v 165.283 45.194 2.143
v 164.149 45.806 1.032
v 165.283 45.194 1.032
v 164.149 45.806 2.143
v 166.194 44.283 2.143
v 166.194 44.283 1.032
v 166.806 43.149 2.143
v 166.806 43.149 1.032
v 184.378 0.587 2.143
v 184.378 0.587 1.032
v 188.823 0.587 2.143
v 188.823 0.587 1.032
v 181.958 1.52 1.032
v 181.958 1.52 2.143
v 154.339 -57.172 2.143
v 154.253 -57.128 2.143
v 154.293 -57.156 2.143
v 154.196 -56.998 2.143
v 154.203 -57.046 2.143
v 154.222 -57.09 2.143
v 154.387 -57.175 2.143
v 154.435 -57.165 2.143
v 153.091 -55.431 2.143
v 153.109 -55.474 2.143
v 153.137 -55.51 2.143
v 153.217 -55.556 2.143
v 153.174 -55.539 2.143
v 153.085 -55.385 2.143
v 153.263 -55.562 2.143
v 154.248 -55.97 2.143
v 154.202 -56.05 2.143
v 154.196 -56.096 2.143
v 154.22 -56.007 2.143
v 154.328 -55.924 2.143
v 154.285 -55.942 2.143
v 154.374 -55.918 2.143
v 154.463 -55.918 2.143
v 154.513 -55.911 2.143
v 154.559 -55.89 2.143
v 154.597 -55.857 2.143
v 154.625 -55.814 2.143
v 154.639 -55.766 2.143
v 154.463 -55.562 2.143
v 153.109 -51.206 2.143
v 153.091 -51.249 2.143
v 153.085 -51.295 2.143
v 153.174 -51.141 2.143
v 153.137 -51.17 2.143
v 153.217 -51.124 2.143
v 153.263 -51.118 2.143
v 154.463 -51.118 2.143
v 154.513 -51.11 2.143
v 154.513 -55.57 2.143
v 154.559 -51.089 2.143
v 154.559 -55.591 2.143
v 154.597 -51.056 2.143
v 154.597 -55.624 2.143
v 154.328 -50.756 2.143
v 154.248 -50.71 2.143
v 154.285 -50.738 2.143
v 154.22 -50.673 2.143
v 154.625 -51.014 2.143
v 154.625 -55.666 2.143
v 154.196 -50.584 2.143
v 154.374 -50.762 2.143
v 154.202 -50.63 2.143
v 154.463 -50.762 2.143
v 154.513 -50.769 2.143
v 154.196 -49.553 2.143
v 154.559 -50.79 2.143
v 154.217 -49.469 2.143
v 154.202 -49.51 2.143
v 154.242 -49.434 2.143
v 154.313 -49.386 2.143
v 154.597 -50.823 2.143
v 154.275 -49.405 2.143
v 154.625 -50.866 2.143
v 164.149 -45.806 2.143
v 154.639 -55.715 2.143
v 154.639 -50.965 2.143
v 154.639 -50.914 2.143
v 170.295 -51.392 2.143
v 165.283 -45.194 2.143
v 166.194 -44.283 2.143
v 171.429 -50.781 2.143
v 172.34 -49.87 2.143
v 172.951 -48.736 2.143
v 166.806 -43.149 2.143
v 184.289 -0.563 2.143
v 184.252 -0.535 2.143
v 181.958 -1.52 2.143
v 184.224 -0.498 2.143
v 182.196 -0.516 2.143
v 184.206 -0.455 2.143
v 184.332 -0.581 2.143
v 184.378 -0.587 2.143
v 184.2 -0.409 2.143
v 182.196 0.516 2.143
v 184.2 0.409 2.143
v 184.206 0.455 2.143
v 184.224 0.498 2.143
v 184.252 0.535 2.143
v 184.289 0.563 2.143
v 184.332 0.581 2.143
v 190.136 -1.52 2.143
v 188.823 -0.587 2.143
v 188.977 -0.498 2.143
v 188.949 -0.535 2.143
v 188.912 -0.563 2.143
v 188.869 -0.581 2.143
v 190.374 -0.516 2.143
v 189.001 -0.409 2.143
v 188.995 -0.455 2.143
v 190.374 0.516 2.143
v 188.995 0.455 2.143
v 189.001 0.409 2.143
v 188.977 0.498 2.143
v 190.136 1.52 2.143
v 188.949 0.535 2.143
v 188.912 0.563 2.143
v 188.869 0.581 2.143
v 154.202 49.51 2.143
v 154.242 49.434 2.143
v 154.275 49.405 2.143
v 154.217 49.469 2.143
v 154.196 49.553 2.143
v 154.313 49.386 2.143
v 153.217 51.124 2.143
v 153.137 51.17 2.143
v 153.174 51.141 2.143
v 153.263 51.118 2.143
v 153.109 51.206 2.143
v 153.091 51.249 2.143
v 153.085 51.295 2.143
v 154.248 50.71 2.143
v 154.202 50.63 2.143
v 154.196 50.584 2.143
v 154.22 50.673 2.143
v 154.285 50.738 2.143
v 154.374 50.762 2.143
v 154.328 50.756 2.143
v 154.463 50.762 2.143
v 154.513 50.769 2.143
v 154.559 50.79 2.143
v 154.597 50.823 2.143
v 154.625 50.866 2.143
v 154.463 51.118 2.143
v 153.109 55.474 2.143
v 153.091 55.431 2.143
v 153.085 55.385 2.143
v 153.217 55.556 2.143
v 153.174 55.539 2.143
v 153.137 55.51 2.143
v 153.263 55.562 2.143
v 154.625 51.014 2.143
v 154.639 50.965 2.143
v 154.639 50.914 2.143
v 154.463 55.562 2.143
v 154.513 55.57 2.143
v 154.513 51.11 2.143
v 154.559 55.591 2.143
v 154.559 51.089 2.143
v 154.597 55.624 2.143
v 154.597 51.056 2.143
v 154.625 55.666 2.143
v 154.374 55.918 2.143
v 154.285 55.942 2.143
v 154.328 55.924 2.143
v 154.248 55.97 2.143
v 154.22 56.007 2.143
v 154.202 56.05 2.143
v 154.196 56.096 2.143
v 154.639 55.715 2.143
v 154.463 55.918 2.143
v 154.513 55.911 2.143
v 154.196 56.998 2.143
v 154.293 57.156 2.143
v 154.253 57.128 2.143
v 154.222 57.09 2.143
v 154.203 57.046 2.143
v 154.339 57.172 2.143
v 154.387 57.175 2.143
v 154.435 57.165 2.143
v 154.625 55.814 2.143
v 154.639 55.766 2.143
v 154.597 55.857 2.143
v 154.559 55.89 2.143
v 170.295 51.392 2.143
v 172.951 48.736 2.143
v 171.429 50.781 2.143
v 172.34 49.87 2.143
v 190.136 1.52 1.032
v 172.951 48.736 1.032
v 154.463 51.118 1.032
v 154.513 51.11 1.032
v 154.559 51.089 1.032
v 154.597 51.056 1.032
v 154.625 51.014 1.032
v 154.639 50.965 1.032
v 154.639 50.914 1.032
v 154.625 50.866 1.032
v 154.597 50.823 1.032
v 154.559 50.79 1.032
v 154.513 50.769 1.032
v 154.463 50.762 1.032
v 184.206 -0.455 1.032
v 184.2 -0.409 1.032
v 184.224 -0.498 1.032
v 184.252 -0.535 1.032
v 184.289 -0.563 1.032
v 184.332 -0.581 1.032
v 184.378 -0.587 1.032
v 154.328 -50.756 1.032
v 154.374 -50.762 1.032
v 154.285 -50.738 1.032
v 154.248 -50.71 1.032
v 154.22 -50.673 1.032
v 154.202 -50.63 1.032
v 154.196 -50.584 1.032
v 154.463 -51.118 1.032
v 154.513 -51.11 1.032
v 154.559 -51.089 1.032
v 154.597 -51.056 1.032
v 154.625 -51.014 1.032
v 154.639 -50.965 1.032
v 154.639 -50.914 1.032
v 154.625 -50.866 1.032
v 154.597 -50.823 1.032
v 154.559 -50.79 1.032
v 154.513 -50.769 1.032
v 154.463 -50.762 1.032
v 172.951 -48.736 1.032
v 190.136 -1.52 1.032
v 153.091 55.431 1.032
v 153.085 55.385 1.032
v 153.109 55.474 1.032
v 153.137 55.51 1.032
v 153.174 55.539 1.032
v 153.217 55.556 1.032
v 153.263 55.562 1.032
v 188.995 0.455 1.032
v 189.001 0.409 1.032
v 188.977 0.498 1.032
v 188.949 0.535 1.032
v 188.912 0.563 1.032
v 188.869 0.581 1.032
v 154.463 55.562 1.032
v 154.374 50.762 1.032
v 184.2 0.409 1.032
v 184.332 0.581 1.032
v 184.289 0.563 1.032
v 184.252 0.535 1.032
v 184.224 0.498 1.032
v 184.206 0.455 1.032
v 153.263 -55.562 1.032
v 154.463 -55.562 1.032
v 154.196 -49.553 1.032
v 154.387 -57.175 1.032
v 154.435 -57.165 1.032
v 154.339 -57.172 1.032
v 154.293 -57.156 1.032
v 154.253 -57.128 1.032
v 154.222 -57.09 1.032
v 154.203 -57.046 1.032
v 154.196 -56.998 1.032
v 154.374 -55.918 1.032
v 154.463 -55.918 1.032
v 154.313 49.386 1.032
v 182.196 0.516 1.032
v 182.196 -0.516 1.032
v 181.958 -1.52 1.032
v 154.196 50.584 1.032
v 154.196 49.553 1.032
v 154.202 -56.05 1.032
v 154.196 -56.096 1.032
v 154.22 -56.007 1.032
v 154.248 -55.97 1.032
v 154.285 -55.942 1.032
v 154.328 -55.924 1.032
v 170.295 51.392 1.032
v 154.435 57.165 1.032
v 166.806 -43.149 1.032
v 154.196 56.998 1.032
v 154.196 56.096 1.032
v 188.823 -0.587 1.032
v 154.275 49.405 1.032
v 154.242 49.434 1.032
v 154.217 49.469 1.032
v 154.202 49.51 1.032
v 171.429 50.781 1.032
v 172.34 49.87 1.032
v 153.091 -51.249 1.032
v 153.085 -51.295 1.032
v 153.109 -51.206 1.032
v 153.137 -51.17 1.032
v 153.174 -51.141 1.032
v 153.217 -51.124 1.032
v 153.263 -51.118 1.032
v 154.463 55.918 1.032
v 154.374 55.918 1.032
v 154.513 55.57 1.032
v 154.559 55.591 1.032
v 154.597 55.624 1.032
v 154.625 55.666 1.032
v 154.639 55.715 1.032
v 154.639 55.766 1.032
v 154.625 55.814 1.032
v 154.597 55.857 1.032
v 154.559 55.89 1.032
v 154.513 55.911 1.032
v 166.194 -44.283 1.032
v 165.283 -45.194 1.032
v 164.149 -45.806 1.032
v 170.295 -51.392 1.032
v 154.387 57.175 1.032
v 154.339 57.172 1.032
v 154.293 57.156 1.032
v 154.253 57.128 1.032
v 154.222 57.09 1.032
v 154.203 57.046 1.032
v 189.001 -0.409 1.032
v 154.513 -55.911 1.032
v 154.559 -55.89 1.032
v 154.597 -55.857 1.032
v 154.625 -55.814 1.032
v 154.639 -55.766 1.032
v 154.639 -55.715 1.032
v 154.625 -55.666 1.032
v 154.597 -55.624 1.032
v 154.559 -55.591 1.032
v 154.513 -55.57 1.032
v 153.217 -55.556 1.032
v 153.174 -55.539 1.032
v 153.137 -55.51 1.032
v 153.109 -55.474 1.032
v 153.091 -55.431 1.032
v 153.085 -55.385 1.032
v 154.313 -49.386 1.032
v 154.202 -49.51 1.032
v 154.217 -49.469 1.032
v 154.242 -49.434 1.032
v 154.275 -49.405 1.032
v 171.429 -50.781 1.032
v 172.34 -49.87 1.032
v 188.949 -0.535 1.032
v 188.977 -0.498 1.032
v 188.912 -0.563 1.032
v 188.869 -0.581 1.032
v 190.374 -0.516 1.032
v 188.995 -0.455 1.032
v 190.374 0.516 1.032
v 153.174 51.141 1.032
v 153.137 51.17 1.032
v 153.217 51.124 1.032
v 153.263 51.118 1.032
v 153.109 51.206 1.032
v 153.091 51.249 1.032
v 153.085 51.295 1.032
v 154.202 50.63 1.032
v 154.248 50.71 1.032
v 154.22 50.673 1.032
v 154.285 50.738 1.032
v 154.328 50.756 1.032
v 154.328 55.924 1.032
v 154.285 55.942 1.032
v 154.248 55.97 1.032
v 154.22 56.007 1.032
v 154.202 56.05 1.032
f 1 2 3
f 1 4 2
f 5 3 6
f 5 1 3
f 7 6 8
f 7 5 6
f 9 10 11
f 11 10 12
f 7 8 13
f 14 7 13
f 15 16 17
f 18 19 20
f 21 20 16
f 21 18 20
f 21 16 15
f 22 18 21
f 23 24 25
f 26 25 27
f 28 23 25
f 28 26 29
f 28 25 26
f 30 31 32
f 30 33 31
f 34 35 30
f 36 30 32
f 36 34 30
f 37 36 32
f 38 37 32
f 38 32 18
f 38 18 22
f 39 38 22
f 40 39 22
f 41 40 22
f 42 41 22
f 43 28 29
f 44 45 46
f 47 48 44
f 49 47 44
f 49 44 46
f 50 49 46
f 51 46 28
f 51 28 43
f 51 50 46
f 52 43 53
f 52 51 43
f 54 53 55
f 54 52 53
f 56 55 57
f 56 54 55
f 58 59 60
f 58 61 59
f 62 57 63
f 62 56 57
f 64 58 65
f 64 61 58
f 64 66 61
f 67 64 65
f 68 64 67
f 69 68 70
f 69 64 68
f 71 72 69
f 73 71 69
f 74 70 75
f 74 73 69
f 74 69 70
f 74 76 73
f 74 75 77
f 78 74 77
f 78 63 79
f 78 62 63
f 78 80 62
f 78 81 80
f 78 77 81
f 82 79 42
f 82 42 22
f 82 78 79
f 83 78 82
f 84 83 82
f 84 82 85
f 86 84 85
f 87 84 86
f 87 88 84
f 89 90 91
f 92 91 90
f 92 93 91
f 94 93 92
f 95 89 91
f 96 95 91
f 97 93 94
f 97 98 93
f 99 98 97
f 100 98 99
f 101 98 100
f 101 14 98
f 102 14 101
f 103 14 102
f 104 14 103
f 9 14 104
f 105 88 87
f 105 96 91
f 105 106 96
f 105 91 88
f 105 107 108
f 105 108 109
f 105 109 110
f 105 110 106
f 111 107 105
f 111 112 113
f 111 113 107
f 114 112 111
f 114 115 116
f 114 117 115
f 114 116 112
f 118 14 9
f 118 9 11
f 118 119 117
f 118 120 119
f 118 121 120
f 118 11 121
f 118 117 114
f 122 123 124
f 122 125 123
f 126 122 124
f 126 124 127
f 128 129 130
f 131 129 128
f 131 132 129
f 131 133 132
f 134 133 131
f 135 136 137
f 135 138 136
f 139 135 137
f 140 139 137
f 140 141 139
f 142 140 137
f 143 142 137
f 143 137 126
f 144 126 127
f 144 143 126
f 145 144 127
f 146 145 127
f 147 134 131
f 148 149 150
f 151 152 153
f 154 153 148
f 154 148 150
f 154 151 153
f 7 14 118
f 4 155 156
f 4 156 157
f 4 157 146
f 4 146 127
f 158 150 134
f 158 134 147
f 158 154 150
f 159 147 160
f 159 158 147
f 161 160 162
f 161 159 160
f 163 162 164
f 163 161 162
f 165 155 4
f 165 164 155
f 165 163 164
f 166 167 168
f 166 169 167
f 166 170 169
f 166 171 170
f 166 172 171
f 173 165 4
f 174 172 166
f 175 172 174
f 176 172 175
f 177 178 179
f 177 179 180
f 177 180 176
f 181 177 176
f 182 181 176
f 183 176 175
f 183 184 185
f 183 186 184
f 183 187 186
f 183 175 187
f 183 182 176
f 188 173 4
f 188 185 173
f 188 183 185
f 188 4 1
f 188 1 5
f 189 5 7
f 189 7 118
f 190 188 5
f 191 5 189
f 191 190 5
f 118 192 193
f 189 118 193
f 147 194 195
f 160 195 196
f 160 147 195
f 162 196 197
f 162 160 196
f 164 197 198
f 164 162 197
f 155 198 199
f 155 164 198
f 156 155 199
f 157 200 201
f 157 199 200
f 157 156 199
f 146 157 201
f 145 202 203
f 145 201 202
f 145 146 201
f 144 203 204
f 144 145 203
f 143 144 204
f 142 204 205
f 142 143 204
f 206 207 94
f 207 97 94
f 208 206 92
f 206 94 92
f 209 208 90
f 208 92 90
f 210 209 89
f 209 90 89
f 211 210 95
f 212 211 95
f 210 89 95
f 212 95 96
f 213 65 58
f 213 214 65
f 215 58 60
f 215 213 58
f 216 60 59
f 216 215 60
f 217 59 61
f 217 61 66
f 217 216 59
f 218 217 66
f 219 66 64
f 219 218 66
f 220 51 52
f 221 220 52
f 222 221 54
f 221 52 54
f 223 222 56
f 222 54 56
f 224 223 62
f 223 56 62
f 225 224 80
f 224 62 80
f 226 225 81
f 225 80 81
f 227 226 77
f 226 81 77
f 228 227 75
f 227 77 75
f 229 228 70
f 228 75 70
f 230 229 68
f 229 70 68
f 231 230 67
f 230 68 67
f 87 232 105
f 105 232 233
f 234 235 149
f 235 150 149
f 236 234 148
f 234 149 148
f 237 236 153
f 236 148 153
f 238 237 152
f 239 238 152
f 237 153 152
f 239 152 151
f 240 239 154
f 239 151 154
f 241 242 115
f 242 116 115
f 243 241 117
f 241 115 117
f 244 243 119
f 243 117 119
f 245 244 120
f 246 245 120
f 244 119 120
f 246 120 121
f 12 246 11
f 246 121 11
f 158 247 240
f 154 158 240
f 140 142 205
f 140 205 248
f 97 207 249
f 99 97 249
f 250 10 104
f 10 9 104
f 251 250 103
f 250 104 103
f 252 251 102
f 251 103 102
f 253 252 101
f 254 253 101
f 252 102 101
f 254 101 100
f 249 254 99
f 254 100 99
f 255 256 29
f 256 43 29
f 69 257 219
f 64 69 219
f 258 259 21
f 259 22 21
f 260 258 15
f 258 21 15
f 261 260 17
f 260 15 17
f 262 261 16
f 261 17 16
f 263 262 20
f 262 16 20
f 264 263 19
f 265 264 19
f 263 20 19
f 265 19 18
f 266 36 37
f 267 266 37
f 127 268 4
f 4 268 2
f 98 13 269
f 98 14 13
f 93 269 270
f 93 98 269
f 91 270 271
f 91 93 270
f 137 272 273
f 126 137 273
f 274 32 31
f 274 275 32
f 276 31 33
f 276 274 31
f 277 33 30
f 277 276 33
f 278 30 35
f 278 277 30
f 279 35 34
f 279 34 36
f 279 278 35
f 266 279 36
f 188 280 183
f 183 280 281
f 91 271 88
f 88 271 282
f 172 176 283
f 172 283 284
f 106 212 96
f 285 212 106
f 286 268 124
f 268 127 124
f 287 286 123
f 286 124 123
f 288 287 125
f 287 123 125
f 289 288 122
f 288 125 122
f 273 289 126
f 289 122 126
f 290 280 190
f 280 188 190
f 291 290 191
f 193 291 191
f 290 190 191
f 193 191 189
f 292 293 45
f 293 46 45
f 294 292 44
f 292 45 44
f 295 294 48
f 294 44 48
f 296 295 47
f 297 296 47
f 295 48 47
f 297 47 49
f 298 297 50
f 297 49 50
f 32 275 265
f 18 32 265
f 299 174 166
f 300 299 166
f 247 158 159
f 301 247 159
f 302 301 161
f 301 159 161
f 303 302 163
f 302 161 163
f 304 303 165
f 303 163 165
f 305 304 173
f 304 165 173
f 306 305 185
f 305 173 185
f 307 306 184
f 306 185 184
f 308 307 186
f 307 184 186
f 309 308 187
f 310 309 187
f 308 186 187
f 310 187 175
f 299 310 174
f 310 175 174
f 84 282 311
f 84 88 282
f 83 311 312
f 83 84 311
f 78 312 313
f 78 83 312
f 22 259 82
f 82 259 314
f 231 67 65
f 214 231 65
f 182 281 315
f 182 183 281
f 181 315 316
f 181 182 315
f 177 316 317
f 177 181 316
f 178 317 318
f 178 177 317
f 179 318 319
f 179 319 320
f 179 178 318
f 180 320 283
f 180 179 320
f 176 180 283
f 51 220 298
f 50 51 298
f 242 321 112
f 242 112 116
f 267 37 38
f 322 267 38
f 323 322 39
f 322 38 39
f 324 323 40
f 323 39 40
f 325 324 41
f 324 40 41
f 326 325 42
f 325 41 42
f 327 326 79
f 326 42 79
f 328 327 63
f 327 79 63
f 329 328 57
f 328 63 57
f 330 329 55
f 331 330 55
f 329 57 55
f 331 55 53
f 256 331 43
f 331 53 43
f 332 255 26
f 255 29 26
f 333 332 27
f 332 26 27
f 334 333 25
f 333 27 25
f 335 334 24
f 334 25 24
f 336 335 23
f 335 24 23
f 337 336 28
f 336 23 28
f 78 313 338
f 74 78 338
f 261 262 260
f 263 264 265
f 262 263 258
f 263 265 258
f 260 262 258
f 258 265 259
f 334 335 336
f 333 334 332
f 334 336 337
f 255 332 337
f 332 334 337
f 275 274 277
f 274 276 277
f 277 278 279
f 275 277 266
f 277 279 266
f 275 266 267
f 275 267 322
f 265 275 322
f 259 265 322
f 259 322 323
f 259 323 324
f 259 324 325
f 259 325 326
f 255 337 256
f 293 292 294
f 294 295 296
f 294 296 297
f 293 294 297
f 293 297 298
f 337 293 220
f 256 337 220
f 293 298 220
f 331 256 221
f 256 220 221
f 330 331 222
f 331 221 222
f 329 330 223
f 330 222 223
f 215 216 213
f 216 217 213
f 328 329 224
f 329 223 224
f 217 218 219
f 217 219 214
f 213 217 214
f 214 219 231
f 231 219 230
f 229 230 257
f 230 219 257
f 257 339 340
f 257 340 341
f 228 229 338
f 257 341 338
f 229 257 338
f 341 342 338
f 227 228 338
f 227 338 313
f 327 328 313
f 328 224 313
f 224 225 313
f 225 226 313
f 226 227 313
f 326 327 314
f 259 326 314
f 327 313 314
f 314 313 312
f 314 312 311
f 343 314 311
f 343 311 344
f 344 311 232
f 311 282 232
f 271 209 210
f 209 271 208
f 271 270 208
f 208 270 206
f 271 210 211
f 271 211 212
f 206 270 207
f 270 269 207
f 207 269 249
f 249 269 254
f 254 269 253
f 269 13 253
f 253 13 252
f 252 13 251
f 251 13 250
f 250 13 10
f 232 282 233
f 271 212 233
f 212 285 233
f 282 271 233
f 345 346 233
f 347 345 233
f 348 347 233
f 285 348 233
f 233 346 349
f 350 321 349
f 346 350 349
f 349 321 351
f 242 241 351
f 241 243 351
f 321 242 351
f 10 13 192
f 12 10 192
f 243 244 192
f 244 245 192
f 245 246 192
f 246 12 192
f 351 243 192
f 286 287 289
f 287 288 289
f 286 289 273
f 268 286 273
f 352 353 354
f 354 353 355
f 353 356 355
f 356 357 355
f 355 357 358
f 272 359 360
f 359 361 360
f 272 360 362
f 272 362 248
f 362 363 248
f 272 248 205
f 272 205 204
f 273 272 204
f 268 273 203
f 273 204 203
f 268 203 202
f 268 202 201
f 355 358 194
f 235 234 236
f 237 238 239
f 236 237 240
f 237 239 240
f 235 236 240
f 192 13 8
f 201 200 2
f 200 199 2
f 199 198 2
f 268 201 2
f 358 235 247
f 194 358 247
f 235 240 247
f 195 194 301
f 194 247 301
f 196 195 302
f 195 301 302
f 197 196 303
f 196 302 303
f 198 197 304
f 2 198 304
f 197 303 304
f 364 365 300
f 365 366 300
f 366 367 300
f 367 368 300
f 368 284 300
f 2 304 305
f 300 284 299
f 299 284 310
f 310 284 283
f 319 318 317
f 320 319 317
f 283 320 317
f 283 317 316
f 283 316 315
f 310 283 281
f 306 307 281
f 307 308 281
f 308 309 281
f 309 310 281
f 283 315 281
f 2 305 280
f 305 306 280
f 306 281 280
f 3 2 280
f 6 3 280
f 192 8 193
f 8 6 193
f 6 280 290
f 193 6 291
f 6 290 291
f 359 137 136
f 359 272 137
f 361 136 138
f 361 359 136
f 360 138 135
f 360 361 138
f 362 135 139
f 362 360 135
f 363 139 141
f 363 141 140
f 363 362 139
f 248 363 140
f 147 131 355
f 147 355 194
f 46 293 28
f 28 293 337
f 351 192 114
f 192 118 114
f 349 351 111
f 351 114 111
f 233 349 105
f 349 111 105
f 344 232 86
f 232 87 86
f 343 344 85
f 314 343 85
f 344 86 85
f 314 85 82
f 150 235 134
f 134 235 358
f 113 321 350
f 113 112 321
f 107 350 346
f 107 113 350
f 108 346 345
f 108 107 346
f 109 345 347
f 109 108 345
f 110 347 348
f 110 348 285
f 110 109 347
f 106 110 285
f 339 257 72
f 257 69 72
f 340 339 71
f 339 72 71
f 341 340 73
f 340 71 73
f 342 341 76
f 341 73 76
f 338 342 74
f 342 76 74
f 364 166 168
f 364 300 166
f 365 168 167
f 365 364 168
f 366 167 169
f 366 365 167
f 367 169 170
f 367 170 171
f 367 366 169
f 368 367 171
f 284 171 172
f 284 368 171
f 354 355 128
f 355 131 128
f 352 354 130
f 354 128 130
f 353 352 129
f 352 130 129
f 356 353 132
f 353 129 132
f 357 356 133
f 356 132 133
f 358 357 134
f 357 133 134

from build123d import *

# Parameters (mm, degrees)
SKETCH1_W           = 13.716
SKETCH1_H           = 3.3528
BOSS_EXTRUDE1_DEPTH = 3.175
FILLET1_R           = 12.7
CUT_EXTRUDE1_DEPTH  = 4.175
FILLET2_R           = 0.508
SCALE1_SCALE        = 0.35


with BuildPart() as part:
    # Sketch1 → Boss-Extrude1 (new body)
    with BuildSketch(Plane.XY):
        Polygon((114.3, 158.75), (114.3, 146.05), (117.475, 146.05), (117.475, 141.224), (151.477068993, 128.848258983), (198.374, 0), (151.477068993, -128.848258983), (117.475, -141.224), (117.475, -146.05), (114.3, -146.05), (114.3, -158.75), (117.475, -158.75), (117.475, -163.576), (169.035670284, -144.809450758), (221.742, 0), (169.035670284, 144.809450758), (117.475, 163.576), (117.475, 158.75), align=None)
        with Locations((210.058, 0)):
            Rectangle(SKETCH1_W, SKETCH1_H, mode=Mode.SUBTRACT)
    extrude(amount=BOSS_EXTRUDE1_DEPTH)

    # Fillet1
    fillet1_edges = [part.edges().sort_by_distance(p)[0] for p in [
        (169.035670284, 144.809450758, 1.5875),
        (221.742, 0, 1.5875),
        (169.035670284, -144.809450758, 1.5875),
        (151.477068993, -128.848258983, 1.5875),
        (198.374, 0, 1.5875),
        (151.477068993, 128.848258983, 1.5875),
    ]]
    fillet(fillet1_edges, radius=FILLET1_R)

    # Sketch2 → Cut-Extrude1 (cut, through all)
    with BuildSketch(Plane.XY.offset(3.175)):
        with BuildLine():
            Line((117.475, 146.05), (118.237, 146.05))
            ThreePointArc((118.237, 146.05), (118.745, 145.542), (118.237, 145.034))
            Line((118.237, 145.034), (117.475, 145.034))
            Line((117.475, 145.034), (117.475, 146.05))
        make_face()
        with BuildLine():
            Line((117.475, 158.75), (118.237, 158.75))
            ThreePointArc((118.237, 158.75), (118.745, 159.258), (118.237, 159.766))
            Line((118.237, 159.766), (117.475, 159.766))
            Line((117.475, 159.766), (117.475, 158.75))
        make_face()
        with BuildLine():
            Line((117.475, -145.034), (117.475, -146.05))
            Line((117.475, -146.05), (118.237, -146.05))
            ThreePointArc((118.237, -146.05), (118.745, -145.542), (118.237, -145.034))
            Line((118.237, -145.034), (117.475, -145.034))
        make_face()
        with BuildLine():
            Line((117.475, -158.75), (117.475, -159.766))
            Line((117.475, -159.766), (118.237, -159.766))
            ThreePointArc((118.237, -159.766), (118.745, -159.258), (118.237, -158.75))
            Line((118.237, -158.75), (117.475, -158.75))
        make_face()
    extrude(amount=-CUT_EXTRUDE1_DEPTH, mode=Mode.SUBTRACT)

    # Fillet2
    fillet2_edges = [part.edges().sort_by_distance(p)[0] for p in [
        (117.475, 163.576, 1.5875),
        (117.475, -163.576, 1.5875),
        (114.3, -158.75, 1.5875),
        (114.3, -146.05, 1.5875),
        (117.475, -141.224, 1.5875),
        (117.475, 141.224, 1.5875),
        (114.3, 146.05, 1.5875),
        (114.3, 158.75, 1.5875),
        (117.475, 159.766, 1.5875),
        (117.475, -159.766, 1.5875),
        (117.475, -145.034, 1.5875),
        (117.475, 145.034, 1.5875),
        (203.2, 1.6764, 1.5875),
        (203.2, -1.6764, 1.5875),
        (216.916, -1.6764, 1.5875),
        (216.916, 1.6764, 1.5875),
    ]]
    fillet(fillet2_edges, radius=FILLET2_R)


with BuildPart() as part_1:
    # Scale1: scaled about (173.96923979, 0, 1.5875)
    add(part.part.scale(SCALE1_SCALE).moved(Location((113.080005863, 0, 1.031875))))


solid = part_1.part
